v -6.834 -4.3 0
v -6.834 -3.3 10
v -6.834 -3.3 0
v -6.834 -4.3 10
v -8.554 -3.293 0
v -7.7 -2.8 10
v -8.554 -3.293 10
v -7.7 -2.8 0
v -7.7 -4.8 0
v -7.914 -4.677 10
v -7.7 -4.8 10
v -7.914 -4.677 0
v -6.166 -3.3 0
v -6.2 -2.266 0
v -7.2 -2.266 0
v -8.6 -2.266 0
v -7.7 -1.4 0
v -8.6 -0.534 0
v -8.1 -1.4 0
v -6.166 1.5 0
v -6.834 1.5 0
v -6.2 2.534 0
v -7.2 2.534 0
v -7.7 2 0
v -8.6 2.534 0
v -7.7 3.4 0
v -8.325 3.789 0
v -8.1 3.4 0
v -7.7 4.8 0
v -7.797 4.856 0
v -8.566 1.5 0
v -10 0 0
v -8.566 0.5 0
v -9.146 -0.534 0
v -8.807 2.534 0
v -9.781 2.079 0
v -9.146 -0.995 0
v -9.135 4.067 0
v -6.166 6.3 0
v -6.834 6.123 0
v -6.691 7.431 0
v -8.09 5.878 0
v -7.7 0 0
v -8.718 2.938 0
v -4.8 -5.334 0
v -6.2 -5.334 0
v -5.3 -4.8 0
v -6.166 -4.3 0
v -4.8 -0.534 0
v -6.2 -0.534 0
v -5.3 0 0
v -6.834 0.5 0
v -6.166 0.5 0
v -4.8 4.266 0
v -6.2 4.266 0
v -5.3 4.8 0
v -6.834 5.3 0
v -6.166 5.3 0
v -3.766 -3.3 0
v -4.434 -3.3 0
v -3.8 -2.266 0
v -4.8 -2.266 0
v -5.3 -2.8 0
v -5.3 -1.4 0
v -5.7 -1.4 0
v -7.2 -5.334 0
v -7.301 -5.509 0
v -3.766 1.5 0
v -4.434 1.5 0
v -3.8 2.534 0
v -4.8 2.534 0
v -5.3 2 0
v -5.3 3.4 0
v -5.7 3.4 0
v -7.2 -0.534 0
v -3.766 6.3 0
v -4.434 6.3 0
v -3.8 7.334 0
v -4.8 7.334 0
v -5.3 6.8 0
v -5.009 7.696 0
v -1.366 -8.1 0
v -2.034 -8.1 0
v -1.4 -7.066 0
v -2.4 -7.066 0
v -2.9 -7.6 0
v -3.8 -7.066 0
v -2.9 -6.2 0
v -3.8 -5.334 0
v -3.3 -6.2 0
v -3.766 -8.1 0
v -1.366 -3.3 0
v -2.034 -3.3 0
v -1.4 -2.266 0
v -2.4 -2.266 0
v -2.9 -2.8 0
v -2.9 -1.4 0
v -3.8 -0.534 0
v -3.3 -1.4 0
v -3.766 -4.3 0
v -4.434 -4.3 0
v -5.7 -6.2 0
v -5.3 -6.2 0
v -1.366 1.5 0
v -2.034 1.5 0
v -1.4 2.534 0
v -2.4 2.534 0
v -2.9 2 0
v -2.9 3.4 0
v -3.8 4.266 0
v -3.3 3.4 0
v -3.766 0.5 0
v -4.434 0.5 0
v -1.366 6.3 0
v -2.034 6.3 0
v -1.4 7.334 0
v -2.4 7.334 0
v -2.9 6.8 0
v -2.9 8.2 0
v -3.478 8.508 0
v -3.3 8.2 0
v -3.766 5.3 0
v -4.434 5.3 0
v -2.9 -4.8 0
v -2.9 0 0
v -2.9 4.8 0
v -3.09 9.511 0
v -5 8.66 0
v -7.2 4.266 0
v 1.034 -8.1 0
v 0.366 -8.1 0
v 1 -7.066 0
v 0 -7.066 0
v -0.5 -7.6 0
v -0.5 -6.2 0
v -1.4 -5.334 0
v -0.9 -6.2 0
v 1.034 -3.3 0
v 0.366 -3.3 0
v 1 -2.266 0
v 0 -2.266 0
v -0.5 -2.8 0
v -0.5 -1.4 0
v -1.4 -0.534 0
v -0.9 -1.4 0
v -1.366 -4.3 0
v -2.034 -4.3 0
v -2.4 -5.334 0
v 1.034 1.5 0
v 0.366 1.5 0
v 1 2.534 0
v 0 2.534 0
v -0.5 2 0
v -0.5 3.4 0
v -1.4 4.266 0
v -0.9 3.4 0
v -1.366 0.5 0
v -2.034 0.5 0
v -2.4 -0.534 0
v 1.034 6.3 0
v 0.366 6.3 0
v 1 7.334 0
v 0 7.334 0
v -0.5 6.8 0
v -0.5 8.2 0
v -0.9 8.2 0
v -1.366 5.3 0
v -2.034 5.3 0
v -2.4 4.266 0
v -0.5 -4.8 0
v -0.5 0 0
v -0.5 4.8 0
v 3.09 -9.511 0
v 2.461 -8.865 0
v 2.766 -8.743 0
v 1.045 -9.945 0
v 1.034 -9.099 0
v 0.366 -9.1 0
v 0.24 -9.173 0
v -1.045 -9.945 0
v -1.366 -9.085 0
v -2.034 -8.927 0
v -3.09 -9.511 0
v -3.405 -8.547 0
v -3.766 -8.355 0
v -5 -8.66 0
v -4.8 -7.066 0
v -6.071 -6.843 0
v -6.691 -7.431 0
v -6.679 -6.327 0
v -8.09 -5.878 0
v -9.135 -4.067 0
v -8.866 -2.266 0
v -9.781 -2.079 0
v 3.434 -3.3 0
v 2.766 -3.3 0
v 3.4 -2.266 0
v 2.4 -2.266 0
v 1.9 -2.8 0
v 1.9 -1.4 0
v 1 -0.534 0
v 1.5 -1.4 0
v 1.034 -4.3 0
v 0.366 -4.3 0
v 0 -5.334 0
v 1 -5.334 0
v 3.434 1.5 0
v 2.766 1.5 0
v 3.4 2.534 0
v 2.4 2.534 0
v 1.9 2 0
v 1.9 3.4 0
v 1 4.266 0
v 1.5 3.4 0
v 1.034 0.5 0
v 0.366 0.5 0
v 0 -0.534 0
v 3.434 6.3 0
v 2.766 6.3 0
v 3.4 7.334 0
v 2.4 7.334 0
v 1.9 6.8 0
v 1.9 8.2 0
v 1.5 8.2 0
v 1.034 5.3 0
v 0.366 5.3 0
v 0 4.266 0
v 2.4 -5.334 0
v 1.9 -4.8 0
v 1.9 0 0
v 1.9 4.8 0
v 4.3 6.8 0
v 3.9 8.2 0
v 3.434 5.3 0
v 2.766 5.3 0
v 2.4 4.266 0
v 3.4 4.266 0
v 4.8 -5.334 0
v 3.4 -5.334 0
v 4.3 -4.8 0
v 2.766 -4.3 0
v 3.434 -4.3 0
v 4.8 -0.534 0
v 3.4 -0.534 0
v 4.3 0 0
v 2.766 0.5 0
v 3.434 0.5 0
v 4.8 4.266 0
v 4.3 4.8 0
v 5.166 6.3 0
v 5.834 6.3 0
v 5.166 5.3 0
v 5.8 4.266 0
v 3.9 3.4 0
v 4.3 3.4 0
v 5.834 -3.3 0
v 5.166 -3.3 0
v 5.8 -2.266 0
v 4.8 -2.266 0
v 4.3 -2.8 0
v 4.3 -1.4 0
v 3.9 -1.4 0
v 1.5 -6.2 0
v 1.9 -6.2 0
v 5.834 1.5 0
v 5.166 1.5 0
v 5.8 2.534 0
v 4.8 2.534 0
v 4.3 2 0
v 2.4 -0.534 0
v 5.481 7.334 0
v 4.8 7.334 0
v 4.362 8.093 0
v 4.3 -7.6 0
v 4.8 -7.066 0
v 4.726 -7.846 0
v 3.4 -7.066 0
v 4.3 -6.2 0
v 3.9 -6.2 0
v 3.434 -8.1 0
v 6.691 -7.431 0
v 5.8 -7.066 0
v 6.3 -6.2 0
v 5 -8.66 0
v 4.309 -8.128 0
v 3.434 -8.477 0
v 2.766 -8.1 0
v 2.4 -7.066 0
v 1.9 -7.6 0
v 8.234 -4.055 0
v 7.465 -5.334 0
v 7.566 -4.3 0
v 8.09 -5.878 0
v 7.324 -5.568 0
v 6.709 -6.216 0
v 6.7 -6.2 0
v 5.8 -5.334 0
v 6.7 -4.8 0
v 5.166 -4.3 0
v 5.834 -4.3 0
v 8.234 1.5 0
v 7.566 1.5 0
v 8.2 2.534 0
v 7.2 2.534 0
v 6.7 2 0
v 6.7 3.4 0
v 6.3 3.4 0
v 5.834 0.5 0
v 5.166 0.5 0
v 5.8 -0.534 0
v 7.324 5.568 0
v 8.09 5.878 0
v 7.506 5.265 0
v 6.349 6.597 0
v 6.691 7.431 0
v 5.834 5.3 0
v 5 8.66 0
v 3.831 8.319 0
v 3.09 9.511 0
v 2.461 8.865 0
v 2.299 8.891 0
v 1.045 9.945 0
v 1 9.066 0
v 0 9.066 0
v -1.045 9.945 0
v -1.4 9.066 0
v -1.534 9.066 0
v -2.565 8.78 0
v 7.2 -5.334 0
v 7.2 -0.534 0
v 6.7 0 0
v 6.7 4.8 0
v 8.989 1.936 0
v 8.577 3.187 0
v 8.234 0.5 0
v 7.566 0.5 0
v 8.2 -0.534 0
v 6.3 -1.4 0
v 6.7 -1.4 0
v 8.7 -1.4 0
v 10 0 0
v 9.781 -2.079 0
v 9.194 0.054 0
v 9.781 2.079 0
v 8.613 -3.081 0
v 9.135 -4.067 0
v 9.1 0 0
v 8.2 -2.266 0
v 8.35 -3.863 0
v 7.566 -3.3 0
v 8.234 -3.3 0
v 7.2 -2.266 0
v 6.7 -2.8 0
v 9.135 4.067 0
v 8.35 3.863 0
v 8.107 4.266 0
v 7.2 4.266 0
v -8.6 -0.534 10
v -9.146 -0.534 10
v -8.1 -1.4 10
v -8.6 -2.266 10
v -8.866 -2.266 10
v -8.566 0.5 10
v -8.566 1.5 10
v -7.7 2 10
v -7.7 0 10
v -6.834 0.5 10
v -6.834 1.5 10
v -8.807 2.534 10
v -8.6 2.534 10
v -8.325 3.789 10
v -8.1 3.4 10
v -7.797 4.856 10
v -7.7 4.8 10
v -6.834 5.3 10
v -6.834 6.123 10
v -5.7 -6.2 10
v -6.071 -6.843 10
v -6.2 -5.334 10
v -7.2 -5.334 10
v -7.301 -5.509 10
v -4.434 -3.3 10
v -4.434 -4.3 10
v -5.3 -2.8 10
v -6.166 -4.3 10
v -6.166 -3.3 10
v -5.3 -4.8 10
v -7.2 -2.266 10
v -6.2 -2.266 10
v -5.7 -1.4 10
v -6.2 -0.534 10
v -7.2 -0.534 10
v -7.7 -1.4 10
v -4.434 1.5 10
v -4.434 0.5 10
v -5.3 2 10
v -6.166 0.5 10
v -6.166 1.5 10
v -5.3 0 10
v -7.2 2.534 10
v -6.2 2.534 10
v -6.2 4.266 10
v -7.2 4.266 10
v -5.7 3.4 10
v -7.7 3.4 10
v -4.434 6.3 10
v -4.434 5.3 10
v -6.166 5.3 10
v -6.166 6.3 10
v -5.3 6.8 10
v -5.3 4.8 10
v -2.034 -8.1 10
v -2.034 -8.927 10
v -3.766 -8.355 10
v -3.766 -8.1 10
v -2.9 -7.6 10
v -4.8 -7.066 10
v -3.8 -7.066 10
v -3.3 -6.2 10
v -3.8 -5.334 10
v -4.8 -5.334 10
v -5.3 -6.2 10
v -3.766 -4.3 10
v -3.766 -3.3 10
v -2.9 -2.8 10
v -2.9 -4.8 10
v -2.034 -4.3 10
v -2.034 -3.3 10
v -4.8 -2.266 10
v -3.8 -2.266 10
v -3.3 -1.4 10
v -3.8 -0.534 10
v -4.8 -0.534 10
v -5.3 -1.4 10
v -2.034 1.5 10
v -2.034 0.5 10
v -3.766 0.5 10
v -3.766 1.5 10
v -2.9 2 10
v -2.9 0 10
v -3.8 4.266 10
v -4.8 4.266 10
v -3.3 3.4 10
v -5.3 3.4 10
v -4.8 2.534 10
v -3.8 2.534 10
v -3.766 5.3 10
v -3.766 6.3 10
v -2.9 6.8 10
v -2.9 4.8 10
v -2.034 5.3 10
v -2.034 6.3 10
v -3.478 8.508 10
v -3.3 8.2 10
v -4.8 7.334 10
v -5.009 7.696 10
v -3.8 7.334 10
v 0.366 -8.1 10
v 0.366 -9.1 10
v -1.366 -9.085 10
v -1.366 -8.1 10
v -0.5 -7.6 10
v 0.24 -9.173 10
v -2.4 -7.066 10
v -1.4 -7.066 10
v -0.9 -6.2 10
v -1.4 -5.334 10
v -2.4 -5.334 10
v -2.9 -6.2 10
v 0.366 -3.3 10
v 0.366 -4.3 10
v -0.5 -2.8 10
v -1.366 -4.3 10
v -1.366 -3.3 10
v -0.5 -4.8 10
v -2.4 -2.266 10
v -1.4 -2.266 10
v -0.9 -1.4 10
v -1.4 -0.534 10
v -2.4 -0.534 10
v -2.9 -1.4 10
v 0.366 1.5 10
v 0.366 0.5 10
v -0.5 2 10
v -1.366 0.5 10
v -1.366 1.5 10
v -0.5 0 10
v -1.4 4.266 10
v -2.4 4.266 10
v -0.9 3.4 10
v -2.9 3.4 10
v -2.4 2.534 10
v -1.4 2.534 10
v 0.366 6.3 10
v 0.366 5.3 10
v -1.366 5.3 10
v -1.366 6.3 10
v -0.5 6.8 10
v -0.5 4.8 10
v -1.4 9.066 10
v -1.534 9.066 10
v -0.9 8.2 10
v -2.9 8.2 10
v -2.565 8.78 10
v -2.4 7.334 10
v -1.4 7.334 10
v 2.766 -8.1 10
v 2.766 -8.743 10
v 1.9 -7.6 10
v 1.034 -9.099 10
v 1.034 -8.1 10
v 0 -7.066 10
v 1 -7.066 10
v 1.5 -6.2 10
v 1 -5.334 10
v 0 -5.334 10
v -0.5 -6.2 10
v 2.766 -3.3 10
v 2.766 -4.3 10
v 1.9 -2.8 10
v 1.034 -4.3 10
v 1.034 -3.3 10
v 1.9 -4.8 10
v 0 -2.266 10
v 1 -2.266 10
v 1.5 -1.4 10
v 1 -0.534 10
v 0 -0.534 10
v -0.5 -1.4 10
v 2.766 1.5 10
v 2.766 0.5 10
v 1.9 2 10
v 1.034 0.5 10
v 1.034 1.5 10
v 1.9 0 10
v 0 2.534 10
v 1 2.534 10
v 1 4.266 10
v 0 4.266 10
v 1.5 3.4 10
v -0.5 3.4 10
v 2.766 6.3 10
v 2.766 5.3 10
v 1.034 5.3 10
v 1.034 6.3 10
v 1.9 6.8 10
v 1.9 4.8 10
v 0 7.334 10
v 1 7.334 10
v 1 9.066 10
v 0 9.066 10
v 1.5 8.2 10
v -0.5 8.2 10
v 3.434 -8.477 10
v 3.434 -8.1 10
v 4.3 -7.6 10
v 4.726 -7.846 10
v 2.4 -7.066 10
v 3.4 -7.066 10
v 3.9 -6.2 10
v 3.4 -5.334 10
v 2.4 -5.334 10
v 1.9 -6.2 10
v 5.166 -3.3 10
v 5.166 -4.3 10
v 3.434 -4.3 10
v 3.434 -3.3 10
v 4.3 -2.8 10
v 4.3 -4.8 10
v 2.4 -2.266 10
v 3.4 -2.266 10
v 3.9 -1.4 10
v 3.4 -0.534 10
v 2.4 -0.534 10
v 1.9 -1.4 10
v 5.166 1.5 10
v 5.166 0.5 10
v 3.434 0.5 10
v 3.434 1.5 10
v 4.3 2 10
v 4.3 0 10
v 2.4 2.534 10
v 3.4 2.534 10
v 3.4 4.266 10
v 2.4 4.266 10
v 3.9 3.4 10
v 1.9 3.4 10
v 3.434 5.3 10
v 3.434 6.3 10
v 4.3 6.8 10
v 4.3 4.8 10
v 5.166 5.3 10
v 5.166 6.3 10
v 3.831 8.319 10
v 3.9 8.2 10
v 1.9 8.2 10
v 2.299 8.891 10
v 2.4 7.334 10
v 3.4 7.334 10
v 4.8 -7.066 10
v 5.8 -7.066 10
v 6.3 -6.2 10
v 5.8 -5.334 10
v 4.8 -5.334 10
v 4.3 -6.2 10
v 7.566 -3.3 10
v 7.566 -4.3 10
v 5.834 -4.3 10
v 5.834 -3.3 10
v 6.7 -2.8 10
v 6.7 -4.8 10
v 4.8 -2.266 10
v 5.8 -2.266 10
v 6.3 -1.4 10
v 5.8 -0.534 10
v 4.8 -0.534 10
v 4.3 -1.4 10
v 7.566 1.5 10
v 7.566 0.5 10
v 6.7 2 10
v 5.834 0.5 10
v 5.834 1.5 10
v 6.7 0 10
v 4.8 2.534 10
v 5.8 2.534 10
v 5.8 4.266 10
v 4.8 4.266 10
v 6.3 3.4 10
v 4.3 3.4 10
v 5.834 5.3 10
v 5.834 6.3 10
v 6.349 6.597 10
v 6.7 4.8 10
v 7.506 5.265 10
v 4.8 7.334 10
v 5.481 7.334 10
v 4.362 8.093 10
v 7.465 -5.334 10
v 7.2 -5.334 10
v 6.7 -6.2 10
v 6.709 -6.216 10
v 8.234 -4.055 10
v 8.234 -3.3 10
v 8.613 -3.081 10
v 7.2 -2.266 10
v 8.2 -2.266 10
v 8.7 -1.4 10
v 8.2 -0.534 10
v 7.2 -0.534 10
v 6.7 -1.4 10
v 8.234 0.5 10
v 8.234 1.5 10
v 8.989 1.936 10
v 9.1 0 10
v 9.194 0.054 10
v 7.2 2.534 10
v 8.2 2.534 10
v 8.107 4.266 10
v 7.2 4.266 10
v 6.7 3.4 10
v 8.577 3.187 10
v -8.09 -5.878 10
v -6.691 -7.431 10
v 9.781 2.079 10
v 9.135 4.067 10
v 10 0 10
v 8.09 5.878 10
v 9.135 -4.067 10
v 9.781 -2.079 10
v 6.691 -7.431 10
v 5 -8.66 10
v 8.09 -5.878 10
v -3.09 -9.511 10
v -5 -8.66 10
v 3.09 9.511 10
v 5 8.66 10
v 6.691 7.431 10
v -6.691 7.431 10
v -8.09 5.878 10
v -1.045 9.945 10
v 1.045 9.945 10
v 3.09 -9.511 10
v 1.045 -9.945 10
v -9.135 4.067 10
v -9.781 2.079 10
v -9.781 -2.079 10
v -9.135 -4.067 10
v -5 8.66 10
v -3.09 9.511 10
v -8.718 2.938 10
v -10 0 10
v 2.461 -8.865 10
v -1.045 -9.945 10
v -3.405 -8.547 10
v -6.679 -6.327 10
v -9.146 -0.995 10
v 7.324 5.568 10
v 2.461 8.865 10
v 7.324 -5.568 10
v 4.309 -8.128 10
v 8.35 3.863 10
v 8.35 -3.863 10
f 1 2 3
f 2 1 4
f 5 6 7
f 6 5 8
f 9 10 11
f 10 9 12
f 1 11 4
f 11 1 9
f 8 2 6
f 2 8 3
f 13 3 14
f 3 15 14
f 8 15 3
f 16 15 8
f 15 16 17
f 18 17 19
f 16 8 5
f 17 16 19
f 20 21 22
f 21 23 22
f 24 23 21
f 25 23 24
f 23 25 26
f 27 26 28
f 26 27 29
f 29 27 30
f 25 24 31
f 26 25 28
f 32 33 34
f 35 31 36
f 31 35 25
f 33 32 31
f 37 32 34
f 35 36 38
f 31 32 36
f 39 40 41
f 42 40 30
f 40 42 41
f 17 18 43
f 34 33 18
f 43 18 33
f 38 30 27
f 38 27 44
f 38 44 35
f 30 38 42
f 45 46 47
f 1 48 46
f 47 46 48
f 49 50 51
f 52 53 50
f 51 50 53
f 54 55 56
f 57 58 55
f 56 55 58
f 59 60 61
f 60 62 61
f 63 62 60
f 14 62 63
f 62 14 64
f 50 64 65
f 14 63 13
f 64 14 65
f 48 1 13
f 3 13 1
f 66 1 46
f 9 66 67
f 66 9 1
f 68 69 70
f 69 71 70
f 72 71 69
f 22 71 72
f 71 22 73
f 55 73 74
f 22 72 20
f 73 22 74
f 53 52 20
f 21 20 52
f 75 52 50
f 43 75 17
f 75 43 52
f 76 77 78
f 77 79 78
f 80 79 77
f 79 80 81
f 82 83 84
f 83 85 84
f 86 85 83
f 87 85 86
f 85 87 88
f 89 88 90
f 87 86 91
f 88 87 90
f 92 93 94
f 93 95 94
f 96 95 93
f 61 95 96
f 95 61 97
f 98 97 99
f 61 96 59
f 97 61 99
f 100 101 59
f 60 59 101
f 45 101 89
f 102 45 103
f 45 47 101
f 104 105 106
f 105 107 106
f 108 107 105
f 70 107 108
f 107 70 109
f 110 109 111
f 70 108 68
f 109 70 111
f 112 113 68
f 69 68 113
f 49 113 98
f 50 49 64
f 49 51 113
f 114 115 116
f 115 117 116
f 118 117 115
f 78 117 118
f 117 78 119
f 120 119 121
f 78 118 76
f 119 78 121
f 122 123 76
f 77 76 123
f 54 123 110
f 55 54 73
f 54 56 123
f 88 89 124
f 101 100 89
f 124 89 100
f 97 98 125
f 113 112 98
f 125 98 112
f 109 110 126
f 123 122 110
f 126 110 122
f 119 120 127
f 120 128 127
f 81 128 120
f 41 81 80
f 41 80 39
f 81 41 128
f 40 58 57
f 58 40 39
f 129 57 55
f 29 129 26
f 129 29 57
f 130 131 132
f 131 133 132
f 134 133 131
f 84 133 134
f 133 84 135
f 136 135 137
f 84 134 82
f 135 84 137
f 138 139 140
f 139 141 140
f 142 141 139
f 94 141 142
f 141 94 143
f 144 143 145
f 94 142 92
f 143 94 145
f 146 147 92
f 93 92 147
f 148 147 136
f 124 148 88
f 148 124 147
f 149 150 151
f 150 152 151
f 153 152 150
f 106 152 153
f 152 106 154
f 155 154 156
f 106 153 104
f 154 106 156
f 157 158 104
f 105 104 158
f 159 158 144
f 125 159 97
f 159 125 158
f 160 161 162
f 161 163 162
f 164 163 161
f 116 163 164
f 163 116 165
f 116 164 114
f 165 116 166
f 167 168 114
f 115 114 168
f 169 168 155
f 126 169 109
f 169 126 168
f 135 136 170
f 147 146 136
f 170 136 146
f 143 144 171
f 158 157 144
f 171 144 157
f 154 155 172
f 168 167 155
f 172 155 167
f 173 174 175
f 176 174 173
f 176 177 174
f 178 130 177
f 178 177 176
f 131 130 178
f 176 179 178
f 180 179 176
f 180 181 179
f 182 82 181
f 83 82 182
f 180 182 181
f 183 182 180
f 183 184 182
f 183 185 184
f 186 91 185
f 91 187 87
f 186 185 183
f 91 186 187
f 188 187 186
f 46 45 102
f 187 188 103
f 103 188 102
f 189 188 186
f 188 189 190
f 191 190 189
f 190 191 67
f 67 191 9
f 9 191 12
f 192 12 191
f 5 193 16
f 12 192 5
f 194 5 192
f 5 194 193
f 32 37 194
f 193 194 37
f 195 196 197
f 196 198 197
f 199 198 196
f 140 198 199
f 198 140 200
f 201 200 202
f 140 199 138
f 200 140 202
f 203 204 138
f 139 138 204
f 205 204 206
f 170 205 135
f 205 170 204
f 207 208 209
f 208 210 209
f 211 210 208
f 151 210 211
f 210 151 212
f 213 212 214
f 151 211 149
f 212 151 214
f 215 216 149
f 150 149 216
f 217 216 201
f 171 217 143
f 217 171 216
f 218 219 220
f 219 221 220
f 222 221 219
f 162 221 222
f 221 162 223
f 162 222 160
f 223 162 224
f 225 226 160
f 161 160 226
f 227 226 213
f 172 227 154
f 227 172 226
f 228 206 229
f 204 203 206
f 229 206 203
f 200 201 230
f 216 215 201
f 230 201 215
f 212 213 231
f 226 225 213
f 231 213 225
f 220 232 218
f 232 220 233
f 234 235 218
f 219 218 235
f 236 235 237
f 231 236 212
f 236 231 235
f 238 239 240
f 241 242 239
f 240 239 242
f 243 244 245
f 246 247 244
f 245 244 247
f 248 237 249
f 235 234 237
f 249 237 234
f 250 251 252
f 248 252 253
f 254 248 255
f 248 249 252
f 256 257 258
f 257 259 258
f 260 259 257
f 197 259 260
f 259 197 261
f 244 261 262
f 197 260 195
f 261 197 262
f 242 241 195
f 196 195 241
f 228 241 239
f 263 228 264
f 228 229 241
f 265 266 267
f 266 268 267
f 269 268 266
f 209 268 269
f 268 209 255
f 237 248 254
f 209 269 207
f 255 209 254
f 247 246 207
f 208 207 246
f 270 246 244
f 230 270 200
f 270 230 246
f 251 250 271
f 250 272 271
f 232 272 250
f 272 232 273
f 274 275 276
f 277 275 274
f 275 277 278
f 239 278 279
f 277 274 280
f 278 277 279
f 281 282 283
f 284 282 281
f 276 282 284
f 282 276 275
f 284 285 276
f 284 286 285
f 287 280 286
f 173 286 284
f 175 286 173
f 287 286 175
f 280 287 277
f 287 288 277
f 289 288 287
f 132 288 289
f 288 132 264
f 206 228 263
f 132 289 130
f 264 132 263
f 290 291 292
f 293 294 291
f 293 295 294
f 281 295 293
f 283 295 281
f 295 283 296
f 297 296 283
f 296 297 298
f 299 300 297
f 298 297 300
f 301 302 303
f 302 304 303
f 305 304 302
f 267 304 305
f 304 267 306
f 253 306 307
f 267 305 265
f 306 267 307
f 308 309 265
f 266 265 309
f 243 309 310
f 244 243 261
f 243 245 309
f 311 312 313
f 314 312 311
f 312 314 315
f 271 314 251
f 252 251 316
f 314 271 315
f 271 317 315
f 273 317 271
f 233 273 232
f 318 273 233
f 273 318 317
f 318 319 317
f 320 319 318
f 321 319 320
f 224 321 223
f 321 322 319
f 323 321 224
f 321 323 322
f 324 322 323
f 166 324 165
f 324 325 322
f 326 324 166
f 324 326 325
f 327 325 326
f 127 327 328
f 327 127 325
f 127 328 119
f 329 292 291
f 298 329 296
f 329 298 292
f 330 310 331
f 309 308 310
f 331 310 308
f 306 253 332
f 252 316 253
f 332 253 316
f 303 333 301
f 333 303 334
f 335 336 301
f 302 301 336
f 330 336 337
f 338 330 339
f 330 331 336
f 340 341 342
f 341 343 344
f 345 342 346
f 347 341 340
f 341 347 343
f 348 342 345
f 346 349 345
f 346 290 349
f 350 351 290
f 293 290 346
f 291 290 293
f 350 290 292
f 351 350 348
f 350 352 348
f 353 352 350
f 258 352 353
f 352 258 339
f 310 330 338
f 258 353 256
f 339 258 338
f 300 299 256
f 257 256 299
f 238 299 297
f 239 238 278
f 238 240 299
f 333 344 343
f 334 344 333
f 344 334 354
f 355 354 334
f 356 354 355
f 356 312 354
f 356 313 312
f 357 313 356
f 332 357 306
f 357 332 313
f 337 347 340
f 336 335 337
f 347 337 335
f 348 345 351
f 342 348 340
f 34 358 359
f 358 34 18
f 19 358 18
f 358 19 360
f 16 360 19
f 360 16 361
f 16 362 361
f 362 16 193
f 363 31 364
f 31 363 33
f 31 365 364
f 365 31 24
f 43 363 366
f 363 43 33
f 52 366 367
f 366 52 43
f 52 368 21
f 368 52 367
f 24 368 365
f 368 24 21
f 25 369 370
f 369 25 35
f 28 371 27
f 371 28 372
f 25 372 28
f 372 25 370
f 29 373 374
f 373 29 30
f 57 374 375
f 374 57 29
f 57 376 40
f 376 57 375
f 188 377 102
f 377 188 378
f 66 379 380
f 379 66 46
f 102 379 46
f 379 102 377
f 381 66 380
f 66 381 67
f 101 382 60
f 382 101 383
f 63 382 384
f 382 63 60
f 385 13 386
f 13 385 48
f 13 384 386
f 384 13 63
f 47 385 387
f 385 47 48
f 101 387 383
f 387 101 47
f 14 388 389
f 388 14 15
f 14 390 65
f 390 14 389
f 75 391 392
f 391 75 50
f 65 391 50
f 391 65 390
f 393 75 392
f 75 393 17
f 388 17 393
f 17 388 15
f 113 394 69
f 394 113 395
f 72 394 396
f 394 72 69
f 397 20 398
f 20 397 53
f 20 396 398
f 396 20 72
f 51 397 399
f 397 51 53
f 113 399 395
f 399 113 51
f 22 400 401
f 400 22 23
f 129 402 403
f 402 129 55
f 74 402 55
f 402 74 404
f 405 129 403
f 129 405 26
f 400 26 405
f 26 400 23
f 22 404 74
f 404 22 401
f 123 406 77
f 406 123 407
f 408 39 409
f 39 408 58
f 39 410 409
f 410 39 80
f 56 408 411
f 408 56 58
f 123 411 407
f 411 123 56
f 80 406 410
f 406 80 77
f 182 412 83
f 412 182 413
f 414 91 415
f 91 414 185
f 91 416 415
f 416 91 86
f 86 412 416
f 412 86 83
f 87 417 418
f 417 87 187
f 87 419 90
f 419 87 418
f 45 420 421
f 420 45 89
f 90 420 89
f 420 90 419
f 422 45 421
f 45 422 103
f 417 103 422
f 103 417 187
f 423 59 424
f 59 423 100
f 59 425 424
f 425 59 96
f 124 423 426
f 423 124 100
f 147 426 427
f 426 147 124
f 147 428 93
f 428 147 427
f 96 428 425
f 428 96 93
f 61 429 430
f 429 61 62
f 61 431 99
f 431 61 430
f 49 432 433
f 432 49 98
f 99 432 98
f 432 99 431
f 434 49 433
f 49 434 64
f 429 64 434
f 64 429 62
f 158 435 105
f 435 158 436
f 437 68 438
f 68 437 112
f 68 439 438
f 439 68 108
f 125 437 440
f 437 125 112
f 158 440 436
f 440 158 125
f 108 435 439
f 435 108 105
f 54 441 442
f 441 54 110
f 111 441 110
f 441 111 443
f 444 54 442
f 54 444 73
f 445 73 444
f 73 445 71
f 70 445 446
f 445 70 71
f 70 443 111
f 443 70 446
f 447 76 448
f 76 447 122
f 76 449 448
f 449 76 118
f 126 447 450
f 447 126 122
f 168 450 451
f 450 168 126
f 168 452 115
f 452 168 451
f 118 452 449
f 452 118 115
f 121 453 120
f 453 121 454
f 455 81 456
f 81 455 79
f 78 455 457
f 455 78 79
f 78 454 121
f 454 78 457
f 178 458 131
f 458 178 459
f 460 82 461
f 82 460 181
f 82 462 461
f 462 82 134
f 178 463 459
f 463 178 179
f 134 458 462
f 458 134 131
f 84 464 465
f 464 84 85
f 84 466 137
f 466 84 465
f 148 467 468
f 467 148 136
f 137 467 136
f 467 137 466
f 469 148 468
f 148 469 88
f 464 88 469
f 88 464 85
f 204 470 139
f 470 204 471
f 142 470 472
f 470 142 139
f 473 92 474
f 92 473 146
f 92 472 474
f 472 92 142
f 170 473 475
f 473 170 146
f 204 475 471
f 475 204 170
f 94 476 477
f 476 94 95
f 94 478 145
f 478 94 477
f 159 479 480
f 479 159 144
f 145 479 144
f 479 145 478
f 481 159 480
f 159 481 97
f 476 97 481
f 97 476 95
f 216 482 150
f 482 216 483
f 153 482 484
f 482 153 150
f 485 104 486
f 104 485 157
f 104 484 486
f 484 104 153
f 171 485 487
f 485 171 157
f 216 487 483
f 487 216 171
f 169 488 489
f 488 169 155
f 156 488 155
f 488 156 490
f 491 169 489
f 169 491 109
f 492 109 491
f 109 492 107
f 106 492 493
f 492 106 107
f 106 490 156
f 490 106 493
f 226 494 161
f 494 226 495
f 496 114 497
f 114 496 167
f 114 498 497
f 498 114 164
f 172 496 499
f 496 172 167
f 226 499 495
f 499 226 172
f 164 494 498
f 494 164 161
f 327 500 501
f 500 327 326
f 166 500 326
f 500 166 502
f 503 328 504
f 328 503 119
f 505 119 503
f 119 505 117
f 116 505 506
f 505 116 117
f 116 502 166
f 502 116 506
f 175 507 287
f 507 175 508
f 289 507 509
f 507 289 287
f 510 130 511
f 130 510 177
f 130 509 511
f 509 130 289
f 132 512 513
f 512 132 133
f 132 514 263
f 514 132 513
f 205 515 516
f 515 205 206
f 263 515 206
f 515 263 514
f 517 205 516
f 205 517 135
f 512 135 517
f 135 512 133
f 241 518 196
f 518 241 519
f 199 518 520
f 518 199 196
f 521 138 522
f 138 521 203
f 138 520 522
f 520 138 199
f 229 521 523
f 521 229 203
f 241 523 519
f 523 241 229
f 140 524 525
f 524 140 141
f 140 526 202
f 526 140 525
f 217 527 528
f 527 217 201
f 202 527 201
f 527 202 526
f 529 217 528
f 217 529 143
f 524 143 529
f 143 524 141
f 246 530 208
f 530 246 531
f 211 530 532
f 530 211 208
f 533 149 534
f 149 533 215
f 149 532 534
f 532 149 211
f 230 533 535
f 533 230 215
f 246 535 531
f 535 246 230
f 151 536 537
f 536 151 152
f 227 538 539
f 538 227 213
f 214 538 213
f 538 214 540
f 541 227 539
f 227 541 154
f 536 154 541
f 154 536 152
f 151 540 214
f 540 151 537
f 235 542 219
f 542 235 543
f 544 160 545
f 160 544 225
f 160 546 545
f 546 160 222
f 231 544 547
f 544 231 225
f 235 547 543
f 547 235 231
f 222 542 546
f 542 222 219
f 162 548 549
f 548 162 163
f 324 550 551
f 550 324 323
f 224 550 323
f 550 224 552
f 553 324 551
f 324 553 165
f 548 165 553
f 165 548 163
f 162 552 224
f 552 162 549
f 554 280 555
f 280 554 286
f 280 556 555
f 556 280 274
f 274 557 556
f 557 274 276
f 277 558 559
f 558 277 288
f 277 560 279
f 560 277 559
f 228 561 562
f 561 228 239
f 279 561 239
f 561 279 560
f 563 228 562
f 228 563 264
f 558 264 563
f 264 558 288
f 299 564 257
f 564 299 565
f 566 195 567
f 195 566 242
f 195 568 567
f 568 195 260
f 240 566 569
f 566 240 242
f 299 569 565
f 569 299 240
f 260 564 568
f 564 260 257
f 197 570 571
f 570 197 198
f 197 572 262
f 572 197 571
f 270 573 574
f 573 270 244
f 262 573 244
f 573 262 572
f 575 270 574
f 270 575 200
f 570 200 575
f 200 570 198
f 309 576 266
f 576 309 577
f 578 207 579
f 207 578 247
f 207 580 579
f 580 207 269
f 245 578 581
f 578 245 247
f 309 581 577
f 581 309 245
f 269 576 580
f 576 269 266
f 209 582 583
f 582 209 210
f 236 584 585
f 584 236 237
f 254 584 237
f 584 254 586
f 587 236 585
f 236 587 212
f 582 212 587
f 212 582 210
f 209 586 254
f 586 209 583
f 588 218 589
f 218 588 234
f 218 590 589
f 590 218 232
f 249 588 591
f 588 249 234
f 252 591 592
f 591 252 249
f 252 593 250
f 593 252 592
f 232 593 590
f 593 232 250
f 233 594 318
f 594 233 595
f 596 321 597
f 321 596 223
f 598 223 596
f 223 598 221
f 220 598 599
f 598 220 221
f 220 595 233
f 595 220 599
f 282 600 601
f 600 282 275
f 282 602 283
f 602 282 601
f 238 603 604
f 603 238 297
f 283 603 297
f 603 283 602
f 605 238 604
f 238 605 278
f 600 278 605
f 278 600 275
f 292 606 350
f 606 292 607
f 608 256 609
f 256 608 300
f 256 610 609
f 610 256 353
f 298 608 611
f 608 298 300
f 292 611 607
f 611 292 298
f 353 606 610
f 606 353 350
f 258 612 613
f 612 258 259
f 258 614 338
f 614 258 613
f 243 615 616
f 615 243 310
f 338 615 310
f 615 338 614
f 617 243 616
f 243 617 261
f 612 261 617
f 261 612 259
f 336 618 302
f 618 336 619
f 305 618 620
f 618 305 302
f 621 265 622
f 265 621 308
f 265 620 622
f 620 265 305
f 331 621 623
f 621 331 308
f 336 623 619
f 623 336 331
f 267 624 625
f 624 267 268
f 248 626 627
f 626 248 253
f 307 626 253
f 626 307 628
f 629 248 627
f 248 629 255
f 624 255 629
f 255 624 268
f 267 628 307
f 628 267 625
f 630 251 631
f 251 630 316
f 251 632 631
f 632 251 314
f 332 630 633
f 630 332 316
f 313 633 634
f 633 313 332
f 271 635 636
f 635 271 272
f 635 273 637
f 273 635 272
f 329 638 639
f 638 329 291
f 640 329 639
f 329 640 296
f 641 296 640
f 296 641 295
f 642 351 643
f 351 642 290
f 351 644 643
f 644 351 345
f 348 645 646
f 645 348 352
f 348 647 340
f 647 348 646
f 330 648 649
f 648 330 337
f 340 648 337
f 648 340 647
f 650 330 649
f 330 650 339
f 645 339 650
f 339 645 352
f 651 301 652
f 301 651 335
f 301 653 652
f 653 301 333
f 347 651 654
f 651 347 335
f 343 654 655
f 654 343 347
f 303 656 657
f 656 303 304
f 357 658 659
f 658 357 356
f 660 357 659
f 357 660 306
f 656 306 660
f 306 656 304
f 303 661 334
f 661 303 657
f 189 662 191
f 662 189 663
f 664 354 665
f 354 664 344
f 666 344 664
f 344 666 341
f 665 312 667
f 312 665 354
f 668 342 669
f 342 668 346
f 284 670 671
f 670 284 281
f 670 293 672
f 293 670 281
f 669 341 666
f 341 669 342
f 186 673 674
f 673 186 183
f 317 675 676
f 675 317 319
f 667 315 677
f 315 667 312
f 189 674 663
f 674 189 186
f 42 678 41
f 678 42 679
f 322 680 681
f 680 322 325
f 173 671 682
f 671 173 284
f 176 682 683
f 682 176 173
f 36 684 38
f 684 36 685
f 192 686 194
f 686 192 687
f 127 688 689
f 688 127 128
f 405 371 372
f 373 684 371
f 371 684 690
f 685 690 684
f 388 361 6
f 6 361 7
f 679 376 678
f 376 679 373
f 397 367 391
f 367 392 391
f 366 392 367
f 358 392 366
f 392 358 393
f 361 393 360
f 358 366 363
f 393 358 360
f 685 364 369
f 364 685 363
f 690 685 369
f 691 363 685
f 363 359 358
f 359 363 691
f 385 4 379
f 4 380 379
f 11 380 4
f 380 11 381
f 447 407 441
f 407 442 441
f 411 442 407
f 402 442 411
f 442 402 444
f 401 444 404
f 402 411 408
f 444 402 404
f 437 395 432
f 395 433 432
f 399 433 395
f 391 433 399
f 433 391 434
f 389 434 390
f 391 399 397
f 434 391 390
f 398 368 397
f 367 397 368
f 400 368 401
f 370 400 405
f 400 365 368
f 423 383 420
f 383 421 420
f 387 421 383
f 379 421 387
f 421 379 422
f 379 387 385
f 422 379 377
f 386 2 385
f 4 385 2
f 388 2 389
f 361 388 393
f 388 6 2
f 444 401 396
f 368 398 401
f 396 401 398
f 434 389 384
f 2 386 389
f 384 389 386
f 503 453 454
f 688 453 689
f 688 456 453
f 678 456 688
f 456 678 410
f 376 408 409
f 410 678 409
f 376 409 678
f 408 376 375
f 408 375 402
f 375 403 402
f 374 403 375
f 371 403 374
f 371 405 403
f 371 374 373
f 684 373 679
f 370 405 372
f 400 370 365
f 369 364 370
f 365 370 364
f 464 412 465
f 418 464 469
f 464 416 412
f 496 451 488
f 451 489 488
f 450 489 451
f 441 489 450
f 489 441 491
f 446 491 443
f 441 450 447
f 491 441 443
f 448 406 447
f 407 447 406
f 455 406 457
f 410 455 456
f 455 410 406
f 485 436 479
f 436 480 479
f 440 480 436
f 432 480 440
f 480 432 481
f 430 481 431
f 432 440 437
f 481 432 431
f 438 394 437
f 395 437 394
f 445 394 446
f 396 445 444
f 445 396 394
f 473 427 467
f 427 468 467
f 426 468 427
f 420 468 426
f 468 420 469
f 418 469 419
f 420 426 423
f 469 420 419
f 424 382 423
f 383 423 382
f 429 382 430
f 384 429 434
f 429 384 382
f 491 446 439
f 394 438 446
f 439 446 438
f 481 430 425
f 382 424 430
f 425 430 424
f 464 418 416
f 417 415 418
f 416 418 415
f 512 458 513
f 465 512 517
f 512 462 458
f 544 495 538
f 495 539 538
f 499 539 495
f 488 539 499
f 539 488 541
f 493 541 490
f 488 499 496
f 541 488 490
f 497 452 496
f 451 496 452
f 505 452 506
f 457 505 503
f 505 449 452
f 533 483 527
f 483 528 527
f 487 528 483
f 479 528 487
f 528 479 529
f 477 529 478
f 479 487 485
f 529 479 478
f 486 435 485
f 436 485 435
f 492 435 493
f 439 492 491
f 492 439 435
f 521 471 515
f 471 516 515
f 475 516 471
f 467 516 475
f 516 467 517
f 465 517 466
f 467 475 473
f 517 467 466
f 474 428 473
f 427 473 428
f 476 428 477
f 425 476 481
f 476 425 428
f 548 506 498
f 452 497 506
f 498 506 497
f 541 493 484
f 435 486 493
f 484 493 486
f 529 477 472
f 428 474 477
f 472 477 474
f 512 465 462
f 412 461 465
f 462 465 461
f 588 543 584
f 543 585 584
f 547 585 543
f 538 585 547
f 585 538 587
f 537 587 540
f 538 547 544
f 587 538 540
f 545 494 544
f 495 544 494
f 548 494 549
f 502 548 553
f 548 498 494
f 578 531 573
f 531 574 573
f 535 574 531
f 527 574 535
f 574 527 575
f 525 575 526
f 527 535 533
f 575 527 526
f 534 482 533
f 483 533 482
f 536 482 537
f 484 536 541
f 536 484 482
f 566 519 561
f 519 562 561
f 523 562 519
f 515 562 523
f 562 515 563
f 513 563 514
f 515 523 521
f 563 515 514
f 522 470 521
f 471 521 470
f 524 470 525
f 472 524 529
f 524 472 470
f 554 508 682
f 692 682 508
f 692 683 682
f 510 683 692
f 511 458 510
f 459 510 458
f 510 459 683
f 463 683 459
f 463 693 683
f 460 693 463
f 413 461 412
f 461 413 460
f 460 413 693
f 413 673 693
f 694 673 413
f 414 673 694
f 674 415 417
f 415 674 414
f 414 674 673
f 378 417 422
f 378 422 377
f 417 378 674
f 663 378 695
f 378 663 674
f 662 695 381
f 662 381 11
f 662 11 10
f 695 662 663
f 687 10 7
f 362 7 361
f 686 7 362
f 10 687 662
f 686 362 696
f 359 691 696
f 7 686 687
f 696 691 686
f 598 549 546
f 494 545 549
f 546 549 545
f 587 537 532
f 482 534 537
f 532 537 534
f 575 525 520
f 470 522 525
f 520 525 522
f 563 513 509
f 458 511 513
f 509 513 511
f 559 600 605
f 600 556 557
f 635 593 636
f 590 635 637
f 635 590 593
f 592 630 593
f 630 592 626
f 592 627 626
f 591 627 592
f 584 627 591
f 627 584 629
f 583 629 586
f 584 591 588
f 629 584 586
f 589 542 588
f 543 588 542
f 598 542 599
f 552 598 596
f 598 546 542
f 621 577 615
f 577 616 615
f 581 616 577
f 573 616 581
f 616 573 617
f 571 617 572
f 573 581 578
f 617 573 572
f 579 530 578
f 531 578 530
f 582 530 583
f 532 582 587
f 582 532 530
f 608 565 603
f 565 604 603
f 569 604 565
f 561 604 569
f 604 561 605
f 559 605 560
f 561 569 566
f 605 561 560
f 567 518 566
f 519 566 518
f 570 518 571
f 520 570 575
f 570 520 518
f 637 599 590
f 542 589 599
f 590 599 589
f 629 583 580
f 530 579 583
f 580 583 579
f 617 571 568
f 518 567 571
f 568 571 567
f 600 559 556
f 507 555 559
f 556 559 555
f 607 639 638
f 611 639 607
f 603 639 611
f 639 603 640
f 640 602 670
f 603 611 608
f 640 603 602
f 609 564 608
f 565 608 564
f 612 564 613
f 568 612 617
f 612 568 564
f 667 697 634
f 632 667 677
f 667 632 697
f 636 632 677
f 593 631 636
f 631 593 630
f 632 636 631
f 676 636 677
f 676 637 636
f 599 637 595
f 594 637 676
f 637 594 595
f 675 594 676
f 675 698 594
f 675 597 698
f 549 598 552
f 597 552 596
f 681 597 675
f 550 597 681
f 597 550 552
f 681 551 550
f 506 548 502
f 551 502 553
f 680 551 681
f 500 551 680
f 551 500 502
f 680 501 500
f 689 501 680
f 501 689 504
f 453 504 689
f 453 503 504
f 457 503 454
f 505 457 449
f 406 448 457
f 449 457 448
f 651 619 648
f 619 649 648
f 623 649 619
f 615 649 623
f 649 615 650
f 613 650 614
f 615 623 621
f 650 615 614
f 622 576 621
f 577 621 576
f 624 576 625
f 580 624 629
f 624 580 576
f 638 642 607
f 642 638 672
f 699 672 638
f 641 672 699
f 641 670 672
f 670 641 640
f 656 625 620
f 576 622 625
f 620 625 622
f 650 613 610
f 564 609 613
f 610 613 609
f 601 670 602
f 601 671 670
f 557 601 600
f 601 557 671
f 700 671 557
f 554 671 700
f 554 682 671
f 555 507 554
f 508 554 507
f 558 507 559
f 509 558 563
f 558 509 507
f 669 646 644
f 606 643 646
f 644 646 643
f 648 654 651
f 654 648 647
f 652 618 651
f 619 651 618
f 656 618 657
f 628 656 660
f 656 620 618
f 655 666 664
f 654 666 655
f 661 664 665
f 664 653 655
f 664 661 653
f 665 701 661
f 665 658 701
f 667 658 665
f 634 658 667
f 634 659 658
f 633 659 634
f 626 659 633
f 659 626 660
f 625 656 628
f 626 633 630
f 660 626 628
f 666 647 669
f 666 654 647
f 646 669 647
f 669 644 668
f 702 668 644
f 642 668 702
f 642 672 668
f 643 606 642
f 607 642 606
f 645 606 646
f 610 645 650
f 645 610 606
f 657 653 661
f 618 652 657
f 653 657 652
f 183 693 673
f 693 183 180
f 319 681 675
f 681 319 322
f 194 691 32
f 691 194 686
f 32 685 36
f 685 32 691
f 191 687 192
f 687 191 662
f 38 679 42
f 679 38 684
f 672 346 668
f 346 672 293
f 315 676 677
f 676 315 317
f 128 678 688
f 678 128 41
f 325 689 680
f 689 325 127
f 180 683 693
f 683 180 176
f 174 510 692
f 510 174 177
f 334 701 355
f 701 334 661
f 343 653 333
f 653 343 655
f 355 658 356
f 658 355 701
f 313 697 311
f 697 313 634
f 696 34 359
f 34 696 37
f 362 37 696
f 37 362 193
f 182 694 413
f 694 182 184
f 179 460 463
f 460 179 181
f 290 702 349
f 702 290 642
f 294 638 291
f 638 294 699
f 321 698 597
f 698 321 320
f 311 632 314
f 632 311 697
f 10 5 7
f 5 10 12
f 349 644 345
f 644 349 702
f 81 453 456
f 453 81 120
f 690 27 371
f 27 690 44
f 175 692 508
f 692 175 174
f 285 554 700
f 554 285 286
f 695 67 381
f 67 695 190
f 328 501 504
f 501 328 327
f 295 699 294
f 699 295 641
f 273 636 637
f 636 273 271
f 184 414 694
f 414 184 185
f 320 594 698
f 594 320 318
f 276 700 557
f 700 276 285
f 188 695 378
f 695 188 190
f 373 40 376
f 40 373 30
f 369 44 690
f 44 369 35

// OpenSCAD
module cutOut(x = 1,y = 1,z = 1,r = 1,s = 0.1){
x = x;
y = x;
z = x;
 d = 2 * r;
for (i = [1:x / (d + s)]){
    for (l = [1:y/ (d + s)]){
translate([i * (d + s) - 0.5 + (l % 2 * (r + s)) - 1,l * (d + s) - 1,0])rotate([0,0,l % 2 * 90])cylinder(h = z,r = r,$fn = 6);
}}
}

module lightCylinder(h = 10,r = 1,b = 2){
    s = 0.4;
difference(){
    cylinder(h = h,r = r);
    translate([-r,-r,0])cutOut(2 * r,2 * r,h,r = 1,s = s);
    
}
difference(){
    cylinder(h = h,r = r);
    translate([0,0,0]) cylinder(h = h,r = r - b);
}
}

lightCylinder(10,10,0.8);
